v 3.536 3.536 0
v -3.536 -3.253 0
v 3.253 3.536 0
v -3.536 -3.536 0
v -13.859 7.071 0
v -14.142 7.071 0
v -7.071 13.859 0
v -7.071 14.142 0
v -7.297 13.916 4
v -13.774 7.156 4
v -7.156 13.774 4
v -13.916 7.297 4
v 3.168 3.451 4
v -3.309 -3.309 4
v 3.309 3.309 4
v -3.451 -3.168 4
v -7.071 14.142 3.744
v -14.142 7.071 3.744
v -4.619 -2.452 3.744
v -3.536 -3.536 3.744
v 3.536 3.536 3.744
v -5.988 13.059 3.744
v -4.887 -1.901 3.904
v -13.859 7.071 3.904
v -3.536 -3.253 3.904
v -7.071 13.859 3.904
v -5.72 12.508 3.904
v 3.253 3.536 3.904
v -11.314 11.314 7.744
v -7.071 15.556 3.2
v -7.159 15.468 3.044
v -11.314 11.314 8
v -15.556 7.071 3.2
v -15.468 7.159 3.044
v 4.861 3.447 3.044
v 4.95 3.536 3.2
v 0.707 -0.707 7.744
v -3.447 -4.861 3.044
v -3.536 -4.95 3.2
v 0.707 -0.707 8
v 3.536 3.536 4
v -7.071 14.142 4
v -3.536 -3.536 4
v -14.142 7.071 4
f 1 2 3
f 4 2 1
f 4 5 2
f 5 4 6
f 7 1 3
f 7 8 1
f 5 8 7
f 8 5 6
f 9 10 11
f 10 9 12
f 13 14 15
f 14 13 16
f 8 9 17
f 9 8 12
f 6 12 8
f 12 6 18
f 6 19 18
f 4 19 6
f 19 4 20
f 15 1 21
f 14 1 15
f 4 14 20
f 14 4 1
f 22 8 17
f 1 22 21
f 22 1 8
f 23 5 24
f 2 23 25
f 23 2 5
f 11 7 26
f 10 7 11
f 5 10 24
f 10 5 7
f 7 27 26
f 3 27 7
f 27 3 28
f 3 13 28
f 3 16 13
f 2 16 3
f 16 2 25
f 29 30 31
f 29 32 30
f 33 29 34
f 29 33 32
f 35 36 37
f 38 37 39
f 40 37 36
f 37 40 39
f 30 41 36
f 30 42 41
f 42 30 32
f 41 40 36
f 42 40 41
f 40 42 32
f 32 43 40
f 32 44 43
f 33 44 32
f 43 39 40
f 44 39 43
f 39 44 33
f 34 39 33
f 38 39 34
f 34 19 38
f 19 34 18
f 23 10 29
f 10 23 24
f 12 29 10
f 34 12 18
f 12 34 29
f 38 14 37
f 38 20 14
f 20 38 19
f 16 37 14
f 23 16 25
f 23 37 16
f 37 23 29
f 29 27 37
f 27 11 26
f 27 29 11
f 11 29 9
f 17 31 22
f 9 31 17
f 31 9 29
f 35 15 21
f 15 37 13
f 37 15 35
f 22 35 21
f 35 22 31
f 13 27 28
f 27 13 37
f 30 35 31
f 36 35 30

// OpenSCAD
// Generated by Parametrix
ca_myPartW_faceTop_000 = [ [ -5.0000, 0.0000 ],[ 5.0000, 0.0000 ],[ 5.0000, 15.0000 ],[ -5.0000, 15.0000 ],[ -5.0000, 0.0000 ] ];
cb_myPartW_faceTop_000 = [  0, 1, 2, 3, 4 ];
ca_myPartW_faceTop_001 = [ [ -4.8000, 0.2000 ],[ 4.8000, 0.2000 ],[ 4.8000, 14.8000 ],[ -4.8000, 14.8000 ],[ -4.8000, 0.2000 ] ];
cb_myPartW_faceTop_001 = [  5, 6, 7, 8, 9 ];
a_myPartW_faceTop = concat(ca_myPartW_faceTop_000, ca_myPartW_faceTop_001);
b_myPartW_faceTop = [cb_myPartW_faceTop_000, cb_myPartW_faceTop_001];
ca_myPartW_faceFace_000 = [ [ 0.0000, 8.0000 ],[ -6.0000, 3.2000 ],[ -5.8751, 3.0438 ],[ 0.0000, 7.7439 ],[ 5.8751, 3.0438 ],[ 6.0000, 3.2000 ],[ 0.0000, 8.0000 ] ];
cb_myPartW_faceFace_000 = [  0, 1, 2, 3, 4, 5, 6 ];
a_myPartW_faceFace = concat(ca_myPartW_faceFace_000);
b_myPartW_faceFace = [cb_myPartW_faceFace_000];

module subpax_myPartW_wall () {
	translate( [ 0, 0, 0 ])
		rotate( [ 0, 0, 45 ])
			   linear_extrude(height = 4) polygon(a_myPartW_faceTop, b_myPartW_faceTop);
}

module subpax_myPartW_roof () {
	translate( [ -11.31370849898476, 11.313708498984761, 0 ])
		rotate( [ 90, 0, 45 ])
			   linear_extrude(height = 17) polygon(a_myPartW_faceFace, b_myPartW_faceFace);
}

module pax_myPartW () {
	union () {
		subpax_myPartW_wall();
subpax_myPartW_roof();
	}
}

pax_myPartW();
